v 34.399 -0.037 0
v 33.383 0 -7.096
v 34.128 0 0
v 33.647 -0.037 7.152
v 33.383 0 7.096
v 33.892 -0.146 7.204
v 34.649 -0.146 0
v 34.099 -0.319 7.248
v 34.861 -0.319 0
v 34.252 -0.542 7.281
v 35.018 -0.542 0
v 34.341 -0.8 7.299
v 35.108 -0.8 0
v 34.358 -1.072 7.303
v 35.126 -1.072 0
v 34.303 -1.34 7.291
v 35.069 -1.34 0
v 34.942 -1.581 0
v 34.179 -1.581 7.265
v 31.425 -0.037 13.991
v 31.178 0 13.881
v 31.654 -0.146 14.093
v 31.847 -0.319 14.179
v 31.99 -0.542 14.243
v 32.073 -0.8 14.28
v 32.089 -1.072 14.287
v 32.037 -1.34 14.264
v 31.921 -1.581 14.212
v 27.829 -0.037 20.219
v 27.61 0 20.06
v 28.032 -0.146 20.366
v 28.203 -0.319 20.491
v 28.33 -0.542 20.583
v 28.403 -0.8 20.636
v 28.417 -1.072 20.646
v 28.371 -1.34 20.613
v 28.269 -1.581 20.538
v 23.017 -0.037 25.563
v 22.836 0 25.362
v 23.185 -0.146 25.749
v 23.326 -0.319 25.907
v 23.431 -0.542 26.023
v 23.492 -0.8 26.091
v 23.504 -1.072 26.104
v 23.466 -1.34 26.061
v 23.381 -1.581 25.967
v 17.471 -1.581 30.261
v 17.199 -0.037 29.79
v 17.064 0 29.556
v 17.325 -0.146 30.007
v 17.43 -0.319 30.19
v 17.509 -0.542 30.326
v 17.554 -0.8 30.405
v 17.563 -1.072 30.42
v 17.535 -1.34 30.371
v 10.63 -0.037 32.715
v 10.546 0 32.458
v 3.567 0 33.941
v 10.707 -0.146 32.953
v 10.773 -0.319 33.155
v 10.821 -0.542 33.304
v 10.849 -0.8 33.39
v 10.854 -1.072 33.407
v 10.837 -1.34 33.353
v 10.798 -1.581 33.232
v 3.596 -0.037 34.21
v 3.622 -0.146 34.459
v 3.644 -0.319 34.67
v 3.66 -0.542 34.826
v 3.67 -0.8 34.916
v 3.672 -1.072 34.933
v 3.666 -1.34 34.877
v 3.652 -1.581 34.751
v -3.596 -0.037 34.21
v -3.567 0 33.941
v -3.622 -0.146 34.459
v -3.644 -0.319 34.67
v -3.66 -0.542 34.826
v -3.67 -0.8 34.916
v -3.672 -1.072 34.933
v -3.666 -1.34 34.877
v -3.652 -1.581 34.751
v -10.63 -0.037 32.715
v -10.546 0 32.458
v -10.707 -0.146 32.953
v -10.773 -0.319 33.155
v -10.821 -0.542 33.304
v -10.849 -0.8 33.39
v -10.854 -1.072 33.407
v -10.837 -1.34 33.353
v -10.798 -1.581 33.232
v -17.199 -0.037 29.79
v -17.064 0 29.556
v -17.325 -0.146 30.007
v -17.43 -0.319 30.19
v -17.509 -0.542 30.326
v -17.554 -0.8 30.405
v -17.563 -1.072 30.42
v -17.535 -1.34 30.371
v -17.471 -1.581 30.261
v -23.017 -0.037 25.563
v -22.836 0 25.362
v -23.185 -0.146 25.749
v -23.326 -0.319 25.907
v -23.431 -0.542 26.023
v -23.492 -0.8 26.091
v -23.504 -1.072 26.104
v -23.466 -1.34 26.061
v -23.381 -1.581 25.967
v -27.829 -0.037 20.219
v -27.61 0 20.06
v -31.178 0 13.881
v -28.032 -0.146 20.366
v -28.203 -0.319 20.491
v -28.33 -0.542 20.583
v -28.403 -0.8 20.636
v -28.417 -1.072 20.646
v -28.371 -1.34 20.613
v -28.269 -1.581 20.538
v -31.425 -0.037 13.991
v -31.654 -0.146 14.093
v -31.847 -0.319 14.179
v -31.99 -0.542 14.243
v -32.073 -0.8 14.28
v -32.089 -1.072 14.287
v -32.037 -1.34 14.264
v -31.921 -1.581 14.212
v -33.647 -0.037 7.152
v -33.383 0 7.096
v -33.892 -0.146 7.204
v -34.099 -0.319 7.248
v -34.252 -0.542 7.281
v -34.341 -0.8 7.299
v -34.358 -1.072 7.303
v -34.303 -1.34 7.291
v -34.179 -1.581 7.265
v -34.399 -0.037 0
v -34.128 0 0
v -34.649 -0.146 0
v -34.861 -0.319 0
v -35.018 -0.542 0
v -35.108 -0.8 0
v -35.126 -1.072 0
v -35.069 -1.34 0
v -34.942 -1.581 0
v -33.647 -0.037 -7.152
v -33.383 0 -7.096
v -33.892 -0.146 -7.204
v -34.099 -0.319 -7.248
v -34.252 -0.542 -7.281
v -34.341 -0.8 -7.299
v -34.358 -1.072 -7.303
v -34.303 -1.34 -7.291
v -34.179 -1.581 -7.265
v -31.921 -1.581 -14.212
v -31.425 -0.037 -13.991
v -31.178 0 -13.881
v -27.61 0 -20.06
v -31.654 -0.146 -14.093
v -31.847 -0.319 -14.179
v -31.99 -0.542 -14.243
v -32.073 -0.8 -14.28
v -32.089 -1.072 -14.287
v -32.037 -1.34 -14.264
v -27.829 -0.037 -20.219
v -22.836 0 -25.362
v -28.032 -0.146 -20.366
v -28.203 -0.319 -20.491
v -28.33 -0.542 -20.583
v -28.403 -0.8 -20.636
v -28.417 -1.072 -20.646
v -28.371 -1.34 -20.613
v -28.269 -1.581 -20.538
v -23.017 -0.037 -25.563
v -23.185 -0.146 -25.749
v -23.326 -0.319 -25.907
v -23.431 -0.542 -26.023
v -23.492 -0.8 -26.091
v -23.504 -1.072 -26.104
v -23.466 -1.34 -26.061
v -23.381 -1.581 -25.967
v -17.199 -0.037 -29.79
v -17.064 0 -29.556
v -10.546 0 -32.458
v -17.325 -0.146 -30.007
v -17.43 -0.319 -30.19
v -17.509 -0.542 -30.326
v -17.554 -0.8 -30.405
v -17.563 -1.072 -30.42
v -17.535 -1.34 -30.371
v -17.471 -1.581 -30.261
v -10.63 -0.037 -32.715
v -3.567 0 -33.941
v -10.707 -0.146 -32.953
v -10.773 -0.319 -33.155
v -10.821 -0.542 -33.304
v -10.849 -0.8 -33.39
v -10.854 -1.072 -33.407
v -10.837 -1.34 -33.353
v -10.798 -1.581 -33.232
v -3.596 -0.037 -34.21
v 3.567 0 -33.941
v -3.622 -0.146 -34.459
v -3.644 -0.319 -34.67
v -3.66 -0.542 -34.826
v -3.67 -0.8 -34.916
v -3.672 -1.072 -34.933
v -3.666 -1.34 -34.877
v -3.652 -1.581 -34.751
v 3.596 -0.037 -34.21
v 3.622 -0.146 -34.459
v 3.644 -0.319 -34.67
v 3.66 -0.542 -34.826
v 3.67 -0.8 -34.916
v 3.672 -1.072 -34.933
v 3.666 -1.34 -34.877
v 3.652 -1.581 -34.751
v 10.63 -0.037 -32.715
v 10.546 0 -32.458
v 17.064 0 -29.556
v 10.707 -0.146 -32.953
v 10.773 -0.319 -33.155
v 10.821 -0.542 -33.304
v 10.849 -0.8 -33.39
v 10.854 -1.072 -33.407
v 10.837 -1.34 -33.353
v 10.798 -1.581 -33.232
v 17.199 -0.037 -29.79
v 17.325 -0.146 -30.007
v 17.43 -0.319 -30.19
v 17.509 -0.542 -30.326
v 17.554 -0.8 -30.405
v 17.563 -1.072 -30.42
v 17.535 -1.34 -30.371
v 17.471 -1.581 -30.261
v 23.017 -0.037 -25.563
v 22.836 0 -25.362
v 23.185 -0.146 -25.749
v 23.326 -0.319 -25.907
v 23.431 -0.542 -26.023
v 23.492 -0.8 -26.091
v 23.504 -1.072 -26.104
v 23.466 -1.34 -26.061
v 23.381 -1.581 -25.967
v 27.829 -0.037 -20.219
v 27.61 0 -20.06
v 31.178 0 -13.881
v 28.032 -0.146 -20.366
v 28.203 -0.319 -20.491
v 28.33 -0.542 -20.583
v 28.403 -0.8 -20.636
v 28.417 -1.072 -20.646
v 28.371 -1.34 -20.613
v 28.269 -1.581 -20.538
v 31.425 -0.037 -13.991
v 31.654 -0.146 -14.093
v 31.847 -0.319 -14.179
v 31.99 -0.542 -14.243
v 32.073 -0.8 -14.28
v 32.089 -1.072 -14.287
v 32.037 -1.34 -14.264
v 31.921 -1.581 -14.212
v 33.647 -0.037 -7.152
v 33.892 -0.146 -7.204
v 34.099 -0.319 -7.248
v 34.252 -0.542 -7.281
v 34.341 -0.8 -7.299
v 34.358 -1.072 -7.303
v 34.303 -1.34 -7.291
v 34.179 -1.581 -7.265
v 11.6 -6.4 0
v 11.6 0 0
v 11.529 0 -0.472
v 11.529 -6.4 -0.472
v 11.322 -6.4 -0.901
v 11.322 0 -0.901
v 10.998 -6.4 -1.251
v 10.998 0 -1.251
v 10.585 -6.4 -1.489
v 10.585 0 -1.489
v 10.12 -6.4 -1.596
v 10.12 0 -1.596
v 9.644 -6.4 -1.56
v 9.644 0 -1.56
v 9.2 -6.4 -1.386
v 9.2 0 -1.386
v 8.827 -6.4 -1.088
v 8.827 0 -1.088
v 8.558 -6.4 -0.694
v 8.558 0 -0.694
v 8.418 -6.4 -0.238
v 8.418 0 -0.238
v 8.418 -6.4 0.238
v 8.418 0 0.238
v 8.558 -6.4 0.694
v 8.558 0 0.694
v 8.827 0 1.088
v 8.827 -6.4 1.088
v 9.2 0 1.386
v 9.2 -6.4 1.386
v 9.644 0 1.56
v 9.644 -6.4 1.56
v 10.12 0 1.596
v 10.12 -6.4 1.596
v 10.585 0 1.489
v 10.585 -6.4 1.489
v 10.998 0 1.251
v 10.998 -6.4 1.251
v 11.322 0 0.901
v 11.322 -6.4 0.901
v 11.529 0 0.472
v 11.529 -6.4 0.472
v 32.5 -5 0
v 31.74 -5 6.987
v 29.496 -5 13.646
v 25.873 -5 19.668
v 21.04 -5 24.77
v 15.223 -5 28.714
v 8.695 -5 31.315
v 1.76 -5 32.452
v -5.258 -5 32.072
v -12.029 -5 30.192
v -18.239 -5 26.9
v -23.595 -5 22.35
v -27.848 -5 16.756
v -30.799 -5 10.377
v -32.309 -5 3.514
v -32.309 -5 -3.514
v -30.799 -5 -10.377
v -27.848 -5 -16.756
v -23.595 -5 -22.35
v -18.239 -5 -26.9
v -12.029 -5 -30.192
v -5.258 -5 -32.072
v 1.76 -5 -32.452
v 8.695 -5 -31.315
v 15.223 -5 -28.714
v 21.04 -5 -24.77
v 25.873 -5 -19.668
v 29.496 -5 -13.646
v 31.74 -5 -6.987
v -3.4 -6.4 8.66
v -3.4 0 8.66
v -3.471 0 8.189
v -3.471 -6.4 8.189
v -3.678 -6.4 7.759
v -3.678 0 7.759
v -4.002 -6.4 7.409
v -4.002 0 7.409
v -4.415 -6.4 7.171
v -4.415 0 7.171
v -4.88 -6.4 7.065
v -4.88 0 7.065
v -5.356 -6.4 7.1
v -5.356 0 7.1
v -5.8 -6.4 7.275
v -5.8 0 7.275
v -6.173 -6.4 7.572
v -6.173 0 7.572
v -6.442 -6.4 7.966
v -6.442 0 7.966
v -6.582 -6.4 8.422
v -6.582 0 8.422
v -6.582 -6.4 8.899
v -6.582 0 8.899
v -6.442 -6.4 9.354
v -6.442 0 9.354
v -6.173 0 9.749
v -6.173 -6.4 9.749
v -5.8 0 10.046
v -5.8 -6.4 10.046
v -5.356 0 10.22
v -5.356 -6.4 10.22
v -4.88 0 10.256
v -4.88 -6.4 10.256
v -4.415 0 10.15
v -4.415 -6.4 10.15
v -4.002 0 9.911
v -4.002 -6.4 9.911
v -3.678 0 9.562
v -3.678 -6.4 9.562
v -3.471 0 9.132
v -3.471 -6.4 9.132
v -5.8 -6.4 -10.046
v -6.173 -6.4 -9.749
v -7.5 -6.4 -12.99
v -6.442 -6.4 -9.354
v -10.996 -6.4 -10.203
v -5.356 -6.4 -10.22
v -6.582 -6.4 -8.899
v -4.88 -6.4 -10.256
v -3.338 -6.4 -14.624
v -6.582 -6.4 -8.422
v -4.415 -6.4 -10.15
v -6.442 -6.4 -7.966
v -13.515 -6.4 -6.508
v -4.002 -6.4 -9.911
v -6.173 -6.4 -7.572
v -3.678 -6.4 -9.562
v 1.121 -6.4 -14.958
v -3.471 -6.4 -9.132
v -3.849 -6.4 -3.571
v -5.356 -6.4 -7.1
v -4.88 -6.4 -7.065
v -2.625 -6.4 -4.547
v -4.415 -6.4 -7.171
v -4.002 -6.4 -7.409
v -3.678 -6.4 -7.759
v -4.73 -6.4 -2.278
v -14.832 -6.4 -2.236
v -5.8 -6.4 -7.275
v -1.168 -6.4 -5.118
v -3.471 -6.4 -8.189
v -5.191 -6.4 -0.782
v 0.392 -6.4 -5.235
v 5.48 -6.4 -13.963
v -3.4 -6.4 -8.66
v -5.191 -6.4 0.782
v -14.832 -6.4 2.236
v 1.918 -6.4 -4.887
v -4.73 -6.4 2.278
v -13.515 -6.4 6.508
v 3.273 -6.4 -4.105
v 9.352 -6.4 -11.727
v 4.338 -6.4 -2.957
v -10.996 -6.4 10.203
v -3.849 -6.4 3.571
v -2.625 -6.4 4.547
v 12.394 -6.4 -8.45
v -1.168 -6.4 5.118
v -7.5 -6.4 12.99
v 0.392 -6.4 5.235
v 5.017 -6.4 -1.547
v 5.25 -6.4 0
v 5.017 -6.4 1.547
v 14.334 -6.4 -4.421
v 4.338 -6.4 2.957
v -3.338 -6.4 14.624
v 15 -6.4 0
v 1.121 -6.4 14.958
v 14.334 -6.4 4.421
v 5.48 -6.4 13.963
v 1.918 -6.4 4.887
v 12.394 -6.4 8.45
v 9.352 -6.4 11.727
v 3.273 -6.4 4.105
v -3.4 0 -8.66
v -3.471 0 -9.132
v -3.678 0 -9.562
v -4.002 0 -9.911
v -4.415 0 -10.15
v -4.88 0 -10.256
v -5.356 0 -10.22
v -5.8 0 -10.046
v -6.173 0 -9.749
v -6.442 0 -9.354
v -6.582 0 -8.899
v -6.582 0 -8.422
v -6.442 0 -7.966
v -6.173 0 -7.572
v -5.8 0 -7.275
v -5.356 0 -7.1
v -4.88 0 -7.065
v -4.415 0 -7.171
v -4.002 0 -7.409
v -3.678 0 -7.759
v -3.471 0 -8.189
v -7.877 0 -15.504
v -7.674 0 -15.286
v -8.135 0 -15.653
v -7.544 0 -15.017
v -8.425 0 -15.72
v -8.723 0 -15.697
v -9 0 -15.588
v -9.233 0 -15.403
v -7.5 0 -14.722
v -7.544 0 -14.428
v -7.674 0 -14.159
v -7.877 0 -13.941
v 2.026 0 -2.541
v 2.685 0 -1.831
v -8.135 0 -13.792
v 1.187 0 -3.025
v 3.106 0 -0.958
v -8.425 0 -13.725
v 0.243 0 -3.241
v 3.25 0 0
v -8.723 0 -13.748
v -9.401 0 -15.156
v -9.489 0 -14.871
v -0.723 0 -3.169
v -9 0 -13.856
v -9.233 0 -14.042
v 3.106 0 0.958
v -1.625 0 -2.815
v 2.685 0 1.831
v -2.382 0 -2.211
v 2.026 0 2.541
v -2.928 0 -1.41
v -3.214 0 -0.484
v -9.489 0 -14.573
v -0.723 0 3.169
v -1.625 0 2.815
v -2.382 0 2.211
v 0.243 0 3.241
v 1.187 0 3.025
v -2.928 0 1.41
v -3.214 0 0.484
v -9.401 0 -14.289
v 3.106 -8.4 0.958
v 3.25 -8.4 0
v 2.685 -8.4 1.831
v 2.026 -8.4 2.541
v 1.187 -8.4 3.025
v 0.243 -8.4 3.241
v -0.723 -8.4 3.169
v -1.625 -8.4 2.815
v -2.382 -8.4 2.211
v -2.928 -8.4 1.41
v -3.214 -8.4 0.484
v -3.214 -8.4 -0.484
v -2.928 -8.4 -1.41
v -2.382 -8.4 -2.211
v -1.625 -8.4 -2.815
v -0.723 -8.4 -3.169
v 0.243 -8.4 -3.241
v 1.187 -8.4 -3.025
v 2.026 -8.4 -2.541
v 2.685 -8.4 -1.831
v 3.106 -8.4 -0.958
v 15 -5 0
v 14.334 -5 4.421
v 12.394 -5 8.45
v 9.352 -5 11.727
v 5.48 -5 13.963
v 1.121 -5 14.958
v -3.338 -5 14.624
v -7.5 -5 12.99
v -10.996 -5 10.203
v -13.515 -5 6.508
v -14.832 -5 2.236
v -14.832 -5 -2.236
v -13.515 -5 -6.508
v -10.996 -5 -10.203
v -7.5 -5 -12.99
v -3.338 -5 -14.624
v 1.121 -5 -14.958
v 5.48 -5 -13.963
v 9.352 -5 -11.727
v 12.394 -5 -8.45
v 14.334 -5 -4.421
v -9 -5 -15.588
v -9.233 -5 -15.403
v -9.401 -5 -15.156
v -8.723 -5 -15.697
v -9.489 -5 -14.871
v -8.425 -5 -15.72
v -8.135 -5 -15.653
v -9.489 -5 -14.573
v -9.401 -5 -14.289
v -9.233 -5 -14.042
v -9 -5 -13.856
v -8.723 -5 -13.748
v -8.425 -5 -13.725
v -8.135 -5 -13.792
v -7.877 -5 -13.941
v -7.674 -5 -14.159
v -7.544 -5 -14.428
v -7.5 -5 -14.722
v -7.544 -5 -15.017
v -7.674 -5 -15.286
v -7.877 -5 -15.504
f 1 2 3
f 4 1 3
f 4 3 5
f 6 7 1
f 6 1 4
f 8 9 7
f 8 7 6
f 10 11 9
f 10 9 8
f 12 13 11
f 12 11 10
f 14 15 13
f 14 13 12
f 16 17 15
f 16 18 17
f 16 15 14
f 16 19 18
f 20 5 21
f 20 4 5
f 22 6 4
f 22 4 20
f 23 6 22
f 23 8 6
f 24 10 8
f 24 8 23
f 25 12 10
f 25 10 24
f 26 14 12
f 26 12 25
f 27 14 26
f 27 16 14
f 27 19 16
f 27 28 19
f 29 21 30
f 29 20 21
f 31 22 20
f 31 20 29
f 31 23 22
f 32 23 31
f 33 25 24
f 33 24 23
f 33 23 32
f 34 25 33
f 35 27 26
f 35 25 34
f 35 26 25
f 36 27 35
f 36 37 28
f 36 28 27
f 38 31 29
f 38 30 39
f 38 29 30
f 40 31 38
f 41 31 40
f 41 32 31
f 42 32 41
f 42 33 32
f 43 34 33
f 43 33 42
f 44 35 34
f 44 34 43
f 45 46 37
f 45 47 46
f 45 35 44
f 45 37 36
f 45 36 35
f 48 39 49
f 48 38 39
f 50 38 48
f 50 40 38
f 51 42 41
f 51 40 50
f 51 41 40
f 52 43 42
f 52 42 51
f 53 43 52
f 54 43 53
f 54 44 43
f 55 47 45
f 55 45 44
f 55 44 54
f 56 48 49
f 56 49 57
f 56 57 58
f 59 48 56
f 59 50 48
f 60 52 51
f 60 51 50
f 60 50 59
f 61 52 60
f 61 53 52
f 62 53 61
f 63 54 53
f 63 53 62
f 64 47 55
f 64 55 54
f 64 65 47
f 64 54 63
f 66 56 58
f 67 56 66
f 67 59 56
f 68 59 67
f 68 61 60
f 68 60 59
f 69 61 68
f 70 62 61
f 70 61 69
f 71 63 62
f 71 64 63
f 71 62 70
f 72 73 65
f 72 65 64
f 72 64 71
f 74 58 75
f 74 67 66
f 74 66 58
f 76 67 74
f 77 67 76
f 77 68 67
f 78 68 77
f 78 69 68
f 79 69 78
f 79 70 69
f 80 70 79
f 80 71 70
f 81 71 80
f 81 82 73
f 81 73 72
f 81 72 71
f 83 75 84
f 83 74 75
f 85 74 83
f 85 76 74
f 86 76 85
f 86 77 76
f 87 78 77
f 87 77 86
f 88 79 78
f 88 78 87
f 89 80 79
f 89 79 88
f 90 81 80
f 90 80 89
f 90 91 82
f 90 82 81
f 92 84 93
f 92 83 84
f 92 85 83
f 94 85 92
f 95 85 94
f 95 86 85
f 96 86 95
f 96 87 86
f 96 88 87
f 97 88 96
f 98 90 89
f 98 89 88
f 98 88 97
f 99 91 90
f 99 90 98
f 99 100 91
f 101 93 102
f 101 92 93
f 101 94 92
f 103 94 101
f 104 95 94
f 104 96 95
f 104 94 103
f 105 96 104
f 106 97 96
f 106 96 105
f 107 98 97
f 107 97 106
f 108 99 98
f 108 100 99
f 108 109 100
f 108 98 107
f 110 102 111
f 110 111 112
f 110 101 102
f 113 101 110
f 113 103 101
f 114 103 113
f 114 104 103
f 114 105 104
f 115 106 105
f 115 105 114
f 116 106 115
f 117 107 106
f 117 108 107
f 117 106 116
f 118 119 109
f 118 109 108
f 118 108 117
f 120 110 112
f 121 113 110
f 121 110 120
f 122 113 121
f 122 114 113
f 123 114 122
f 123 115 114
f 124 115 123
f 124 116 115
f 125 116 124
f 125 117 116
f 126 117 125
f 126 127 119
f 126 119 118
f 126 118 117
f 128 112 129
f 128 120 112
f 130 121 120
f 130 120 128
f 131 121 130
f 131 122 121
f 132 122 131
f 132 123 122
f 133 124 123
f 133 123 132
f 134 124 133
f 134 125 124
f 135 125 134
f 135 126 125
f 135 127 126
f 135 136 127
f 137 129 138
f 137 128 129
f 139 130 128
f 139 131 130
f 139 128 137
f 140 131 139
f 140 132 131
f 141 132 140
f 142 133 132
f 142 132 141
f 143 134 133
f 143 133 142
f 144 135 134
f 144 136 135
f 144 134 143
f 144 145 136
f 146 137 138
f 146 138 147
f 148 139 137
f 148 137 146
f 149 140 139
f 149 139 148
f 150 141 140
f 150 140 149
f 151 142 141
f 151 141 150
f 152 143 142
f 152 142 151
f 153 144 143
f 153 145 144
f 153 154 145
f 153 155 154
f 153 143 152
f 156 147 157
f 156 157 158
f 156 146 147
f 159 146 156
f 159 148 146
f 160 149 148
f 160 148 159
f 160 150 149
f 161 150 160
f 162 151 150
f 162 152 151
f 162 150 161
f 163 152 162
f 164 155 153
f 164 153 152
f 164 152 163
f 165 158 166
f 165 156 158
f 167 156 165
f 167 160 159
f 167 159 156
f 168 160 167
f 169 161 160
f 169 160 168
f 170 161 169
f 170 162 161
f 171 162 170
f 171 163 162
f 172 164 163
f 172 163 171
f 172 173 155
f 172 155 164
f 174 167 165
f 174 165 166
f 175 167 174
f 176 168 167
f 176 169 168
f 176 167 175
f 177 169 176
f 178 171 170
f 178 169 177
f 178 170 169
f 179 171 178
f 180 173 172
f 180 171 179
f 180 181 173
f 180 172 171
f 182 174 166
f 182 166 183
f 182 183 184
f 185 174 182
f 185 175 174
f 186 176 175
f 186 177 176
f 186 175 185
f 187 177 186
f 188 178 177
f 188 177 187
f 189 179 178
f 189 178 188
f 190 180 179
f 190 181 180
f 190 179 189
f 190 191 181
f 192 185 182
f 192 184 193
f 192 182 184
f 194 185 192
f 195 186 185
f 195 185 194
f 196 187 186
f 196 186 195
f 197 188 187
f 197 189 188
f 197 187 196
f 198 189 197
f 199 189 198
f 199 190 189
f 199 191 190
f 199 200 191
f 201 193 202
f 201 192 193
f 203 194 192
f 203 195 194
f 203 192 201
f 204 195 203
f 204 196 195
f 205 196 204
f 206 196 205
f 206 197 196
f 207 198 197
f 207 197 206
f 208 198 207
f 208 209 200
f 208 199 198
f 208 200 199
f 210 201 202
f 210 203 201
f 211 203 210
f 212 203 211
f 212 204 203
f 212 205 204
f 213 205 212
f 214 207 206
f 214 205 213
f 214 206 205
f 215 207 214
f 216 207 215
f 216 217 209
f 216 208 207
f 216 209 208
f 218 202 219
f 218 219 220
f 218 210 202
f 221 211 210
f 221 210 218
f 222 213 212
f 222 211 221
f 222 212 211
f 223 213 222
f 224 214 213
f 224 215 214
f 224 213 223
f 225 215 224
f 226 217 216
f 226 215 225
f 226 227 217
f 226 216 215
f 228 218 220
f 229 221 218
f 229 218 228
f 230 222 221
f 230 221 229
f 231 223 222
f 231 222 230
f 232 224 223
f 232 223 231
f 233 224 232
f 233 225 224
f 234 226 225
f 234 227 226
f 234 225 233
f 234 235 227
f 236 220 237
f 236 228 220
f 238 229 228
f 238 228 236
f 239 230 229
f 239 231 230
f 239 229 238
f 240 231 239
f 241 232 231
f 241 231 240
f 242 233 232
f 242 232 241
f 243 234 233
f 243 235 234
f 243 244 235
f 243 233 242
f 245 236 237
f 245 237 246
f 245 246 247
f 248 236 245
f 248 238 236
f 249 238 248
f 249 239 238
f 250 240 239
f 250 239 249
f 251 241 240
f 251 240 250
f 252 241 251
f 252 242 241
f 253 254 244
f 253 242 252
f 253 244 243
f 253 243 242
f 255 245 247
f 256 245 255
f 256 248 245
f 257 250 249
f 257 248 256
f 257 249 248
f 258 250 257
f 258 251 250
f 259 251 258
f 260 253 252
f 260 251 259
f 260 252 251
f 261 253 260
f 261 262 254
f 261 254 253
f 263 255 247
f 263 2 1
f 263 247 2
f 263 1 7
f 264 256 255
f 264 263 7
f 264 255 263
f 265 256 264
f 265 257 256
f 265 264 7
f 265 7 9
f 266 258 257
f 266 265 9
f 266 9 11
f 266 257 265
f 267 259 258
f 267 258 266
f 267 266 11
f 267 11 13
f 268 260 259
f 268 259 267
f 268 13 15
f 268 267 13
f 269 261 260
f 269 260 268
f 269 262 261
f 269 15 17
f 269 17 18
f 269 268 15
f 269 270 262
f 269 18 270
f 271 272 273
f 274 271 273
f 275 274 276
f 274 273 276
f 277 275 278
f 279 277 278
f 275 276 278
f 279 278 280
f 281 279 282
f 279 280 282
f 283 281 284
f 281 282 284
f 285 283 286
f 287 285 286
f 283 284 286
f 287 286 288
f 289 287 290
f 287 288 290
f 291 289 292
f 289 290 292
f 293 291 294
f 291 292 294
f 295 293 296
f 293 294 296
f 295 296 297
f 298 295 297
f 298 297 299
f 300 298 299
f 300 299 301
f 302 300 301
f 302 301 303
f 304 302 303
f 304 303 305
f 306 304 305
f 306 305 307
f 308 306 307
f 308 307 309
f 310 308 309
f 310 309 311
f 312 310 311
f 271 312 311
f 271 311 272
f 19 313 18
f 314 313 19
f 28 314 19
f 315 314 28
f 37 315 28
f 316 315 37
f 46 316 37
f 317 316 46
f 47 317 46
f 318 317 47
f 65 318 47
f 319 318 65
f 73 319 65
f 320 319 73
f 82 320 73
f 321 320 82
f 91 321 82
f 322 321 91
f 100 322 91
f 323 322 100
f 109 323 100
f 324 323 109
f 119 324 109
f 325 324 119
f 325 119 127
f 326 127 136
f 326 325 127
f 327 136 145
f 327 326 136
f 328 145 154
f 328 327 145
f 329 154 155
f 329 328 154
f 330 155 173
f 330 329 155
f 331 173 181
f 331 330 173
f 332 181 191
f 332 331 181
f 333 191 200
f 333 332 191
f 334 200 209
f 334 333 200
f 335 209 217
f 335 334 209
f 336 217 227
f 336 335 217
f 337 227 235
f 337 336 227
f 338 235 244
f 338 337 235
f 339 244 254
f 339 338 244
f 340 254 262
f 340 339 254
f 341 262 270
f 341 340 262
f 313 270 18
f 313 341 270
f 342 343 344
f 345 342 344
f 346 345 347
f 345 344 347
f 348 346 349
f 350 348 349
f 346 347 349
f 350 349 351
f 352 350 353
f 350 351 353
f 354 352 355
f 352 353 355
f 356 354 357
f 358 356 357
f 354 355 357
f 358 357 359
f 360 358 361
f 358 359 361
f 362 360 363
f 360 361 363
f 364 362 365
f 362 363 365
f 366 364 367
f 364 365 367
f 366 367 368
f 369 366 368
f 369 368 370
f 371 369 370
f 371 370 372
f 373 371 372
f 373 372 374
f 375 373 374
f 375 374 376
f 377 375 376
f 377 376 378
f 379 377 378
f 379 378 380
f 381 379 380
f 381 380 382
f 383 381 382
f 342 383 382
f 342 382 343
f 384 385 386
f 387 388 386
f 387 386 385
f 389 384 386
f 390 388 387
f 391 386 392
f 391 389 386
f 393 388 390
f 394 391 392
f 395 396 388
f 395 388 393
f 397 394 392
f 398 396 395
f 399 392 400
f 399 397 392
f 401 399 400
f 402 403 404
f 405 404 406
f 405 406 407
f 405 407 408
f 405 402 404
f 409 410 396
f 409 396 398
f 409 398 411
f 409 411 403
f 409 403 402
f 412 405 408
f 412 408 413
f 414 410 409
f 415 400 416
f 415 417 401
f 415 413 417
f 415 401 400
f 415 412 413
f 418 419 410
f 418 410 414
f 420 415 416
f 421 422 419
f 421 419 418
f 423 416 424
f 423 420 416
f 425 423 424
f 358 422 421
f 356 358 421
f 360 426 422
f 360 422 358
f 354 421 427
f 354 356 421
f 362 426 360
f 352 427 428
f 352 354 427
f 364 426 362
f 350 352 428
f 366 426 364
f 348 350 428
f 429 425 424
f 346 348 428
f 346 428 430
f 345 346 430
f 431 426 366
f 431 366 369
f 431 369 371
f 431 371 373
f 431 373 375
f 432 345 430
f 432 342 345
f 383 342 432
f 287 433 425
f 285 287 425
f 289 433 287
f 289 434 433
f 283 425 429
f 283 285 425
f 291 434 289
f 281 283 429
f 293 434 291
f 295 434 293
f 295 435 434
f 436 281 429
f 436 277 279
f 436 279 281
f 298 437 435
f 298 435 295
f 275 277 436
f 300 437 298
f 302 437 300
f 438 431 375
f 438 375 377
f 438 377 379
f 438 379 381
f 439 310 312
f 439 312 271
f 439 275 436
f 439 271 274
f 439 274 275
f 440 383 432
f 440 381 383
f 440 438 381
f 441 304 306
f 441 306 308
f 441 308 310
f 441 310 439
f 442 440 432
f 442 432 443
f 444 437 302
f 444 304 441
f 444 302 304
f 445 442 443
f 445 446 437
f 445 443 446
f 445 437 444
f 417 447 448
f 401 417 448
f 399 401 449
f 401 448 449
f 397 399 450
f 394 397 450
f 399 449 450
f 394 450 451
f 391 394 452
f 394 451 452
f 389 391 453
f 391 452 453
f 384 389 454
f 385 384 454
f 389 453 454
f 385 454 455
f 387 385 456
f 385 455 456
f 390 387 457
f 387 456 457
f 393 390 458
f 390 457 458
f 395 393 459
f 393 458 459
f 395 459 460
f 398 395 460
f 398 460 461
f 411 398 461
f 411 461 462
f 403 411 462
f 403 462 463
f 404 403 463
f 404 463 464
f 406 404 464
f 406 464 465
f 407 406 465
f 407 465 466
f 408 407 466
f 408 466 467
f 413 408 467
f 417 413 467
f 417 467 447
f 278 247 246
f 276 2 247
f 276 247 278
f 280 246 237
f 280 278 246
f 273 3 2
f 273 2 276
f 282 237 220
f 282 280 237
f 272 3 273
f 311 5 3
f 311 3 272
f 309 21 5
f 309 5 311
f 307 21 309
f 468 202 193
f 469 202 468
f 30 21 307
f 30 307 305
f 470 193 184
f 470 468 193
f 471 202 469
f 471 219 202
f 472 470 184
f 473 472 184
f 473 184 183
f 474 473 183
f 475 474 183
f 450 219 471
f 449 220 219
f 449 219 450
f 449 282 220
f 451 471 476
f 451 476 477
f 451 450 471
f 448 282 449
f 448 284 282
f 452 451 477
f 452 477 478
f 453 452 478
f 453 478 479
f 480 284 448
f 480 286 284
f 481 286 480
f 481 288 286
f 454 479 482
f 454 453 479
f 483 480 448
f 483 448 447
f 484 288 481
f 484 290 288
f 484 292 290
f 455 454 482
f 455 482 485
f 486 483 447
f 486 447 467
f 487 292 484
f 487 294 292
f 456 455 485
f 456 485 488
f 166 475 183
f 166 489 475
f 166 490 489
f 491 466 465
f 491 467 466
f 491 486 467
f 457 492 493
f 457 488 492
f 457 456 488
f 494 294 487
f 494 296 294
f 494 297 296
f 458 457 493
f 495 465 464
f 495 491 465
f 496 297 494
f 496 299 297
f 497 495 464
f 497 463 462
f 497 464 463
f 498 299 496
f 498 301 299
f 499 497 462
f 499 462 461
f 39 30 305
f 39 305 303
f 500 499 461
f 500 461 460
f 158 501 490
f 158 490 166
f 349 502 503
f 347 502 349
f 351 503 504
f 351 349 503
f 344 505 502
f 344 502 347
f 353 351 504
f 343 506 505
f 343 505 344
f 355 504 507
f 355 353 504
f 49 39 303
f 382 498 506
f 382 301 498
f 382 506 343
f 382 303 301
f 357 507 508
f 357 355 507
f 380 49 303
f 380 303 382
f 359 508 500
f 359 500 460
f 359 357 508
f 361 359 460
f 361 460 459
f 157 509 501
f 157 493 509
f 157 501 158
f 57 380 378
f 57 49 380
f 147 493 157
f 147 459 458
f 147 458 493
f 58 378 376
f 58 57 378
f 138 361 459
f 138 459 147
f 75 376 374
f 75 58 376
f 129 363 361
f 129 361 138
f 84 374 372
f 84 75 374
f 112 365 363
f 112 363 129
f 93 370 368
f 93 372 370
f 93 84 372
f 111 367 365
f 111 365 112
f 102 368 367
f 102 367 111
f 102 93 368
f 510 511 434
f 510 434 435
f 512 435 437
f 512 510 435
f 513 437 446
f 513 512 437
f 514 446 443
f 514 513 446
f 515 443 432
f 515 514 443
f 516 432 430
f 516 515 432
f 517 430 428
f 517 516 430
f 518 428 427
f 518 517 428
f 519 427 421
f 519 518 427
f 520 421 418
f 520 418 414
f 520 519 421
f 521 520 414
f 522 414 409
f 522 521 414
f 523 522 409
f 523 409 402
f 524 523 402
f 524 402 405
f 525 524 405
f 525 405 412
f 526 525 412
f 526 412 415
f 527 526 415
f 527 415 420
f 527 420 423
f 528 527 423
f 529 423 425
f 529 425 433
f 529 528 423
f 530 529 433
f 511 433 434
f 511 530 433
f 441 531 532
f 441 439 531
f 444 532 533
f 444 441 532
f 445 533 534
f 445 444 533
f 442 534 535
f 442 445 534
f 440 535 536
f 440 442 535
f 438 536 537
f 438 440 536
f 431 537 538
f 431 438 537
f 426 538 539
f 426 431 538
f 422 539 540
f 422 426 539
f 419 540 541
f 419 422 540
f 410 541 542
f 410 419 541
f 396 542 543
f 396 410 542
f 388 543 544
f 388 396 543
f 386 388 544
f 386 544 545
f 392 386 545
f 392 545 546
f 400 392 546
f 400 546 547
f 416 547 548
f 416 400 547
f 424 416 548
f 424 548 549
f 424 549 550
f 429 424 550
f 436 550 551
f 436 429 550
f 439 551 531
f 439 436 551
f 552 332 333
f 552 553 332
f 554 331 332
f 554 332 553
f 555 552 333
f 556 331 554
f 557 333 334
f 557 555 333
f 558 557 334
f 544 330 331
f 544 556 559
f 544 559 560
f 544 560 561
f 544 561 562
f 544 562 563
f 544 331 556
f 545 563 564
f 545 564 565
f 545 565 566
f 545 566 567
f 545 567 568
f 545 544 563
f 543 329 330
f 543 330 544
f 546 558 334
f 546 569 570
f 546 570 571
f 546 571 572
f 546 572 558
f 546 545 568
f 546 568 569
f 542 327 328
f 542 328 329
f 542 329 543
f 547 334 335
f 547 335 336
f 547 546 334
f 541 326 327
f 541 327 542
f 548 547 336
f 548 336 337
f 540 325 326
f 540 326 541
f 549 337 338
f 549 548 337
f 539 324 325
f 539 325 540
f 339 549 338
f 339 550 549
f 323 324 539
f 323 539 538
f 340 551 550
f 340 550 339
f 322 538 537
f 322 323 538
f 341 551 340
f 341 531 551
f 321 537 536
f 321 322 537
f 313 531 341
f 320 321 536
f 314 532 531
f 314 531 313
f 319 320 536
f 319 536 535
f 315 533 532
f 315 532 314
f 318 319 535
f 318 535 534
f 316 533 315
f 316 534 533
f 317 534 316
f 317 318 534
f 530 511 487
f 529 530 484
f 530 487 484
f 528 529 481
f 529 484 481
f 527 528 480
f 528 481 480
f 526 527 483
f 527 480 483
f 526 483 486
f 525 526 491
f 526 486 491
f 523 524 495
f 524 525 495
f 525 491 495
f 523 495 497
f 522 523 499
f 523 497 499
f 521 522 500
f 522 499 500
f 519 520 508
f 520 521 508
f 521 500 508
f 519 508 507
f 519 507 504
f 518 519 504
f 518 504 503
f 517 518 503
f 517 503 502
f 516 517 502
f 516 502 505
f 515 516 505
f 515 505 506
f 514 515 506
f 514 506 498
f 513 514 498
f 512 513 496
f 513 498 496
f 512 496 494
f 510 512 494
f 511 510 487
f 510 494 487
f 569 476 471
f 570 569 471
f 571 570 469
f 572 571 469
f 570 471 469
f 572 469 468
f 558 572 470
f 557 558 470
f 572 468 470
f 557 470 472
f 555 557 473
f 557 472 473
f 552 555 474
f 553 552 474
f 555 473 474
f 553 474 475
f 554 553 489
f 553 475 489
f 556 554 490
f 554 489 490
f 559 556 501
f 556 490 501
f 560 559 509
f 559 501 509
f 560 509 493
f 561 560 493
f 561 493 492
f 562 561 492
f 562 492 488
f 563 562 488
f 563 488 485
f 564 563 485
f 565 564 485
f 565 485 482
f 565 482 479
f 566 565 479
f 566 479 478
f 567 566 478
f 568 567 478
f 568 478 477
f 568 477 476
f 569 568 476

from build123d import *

# Parameters (mm, degrees)
CONG_1_R                = 1
ENL_V_MAT_EXTRU_1_REACH = 10.4
ESQUISSE2_R             = 3.25
ESQUISSE2_R_2           = 1.6
ESQUISSE2_R_3           = 1


with BuildPart() as part:
    # Esquisse1 → Révolution1 (revolve)
    with BuildSketch(Plane.XY):
        Polygon((0, 0), (36.071734624, 0), (32.5, -5), (15, -5), (15, -6.4), (5.25, -6.4), (3.25, -8.4), (0, -8.4), align=None)
    revolve(axis=Axis((0, 33.166287016, 0), (0, -1, 0)))

    # Congé1
    cong_1_edges = [part.edges().sort_by_distance(p)[0] for p in [
        (-36.071734624, 0, 0),
    ]]
    fillet(cong_1_edges, radius=CONG_1_R)

    # Esquisse2 → Enlèv. mat.-Extru.1 (cut, up to next)
    with BuildSketch(Plane(origin=(0, 0, 0), x_dir=(1, 0, 0), z_dir=(0, 1, 0)), mode=Mode.PRIVATE) as enl_v_mat_extru_1_sk1:
        Circle(ESQUISSE2_R)
    enl_v_mat_extru_1_tool1 = extrude(enl_v_mat_extru_1_sk1.sketch, amount=-ENL_V_MAT_EXTRU_1_REACH, mode=Mode.PRIVATE) & part.part
    add(enl_v_mat_extru_1_tool1.solids().sort_by_distance((0, 0, 0))[0], mode=Mode.SUBTRACT)
    # Esquisse2 → Enlèv. mat.-Extru.1 (cut, up to next)
    with BuildSketch(Plane(origin=(0, 0, 0), x_dir=(1, 0, 0), z_dir=(0, 1, 0)), mode=Mode.PRIVATE) as enl_v_mat_extru_1_sk2:
        with Locations((10, 0)):
            Circle(ESQUISSE2_R_2)
    enl_v_mat_extru_1_tool2 = extrude(enl_v_mat_extru_1_sk2.sketch, amount=-ENL_V_MAT_EXTRU_1_REACH, mode=Mode.PRIVATE) & part.part
    add(enl_v_mat_extru_1_tool2.solids().sort_by_distance((10, 0, 0))[0], mode=Mode.SUBTRACT)
    # Esquisse2 → Enlèv. mat.-Extru.1 (cut, up to next)
    with BuildSketch(Plane(origin=(0, 0, 0), x_dir=(1, 0, 0), z_dir=(0, 1, 0)), mode=Mode.PRIVATE) as enl_v_mat_extru_1_sk3:
        with Locations((-5, -8.660254038)):
            Circle(ESQUISSE2_R_2)
    enl_v_mat_extru_1_tool3 = extrude(enl_v_mat_extru_1_sk3.sketch, amount=-ENL_V_MAT_EXTRU_1_REACH, mode=Mode.PRIVATE) & part.part
    add(enl_v_mat_extru_1_tool3.solids().sort_by_distance((-5, 0, 8.660254))[0], mode=Mode.SUBTRACT)
    # Esquisse2 → Enlèv. mat.-Extru.1 (cut, up to next)
    with BuildSketch(Plane(origin=(0, 0, 0), x_dir=(1, 0, 0), z_dir=(0, 1, 0)), mode=Mode.PRIVATE) as enl_v_mat_extru_1_sk4:
        with Locations((-5, 8.660254038)):
            Circle(ESQUISSE2_R_2)
    enl_v_mat_extru_1_tool4 = extrude(enl_v_mat_extru_1_sk4.sketch, amount=-ENL_V_MAT_EXTRU_1_REACH, mode=Mode.PRIVATE) & part.part
    add(enl_v_mat_extru_1_tool4.solids().sort_by_distance((-5, 0, -8.660254))[0], mode=Mode.SUBTRACT)
    # Esquisse2 → Enlèv. mat.-Extru.1 (cut, up to next)
    with BuildSketch(Plane(origin=(0, 0, 0), x_dir=(1, 0, 0), z_dir=(0, 1, 0)), mode=Mode.PRIVATE) as enl_v_mat_extru_1_sk5:
        with Locations((-8.5, 14.722431864)):
            Circle(ESQUISSE2_R_3)
    enl_v_mat_extru_1_tool5 = extrude(enl_v_mat_extru_1_sk5.sketch, amount=-ENL_V_MAT_EXTRU_1_REACH, mode=Mode.PRIVATE) & part.part
    add(enl_v_mat_extru_1_tool5.solids().sort_by_distance((-8.5, 0, -14.722432))[0], mode=Mode.SUBTRACT)


solid = part.part
